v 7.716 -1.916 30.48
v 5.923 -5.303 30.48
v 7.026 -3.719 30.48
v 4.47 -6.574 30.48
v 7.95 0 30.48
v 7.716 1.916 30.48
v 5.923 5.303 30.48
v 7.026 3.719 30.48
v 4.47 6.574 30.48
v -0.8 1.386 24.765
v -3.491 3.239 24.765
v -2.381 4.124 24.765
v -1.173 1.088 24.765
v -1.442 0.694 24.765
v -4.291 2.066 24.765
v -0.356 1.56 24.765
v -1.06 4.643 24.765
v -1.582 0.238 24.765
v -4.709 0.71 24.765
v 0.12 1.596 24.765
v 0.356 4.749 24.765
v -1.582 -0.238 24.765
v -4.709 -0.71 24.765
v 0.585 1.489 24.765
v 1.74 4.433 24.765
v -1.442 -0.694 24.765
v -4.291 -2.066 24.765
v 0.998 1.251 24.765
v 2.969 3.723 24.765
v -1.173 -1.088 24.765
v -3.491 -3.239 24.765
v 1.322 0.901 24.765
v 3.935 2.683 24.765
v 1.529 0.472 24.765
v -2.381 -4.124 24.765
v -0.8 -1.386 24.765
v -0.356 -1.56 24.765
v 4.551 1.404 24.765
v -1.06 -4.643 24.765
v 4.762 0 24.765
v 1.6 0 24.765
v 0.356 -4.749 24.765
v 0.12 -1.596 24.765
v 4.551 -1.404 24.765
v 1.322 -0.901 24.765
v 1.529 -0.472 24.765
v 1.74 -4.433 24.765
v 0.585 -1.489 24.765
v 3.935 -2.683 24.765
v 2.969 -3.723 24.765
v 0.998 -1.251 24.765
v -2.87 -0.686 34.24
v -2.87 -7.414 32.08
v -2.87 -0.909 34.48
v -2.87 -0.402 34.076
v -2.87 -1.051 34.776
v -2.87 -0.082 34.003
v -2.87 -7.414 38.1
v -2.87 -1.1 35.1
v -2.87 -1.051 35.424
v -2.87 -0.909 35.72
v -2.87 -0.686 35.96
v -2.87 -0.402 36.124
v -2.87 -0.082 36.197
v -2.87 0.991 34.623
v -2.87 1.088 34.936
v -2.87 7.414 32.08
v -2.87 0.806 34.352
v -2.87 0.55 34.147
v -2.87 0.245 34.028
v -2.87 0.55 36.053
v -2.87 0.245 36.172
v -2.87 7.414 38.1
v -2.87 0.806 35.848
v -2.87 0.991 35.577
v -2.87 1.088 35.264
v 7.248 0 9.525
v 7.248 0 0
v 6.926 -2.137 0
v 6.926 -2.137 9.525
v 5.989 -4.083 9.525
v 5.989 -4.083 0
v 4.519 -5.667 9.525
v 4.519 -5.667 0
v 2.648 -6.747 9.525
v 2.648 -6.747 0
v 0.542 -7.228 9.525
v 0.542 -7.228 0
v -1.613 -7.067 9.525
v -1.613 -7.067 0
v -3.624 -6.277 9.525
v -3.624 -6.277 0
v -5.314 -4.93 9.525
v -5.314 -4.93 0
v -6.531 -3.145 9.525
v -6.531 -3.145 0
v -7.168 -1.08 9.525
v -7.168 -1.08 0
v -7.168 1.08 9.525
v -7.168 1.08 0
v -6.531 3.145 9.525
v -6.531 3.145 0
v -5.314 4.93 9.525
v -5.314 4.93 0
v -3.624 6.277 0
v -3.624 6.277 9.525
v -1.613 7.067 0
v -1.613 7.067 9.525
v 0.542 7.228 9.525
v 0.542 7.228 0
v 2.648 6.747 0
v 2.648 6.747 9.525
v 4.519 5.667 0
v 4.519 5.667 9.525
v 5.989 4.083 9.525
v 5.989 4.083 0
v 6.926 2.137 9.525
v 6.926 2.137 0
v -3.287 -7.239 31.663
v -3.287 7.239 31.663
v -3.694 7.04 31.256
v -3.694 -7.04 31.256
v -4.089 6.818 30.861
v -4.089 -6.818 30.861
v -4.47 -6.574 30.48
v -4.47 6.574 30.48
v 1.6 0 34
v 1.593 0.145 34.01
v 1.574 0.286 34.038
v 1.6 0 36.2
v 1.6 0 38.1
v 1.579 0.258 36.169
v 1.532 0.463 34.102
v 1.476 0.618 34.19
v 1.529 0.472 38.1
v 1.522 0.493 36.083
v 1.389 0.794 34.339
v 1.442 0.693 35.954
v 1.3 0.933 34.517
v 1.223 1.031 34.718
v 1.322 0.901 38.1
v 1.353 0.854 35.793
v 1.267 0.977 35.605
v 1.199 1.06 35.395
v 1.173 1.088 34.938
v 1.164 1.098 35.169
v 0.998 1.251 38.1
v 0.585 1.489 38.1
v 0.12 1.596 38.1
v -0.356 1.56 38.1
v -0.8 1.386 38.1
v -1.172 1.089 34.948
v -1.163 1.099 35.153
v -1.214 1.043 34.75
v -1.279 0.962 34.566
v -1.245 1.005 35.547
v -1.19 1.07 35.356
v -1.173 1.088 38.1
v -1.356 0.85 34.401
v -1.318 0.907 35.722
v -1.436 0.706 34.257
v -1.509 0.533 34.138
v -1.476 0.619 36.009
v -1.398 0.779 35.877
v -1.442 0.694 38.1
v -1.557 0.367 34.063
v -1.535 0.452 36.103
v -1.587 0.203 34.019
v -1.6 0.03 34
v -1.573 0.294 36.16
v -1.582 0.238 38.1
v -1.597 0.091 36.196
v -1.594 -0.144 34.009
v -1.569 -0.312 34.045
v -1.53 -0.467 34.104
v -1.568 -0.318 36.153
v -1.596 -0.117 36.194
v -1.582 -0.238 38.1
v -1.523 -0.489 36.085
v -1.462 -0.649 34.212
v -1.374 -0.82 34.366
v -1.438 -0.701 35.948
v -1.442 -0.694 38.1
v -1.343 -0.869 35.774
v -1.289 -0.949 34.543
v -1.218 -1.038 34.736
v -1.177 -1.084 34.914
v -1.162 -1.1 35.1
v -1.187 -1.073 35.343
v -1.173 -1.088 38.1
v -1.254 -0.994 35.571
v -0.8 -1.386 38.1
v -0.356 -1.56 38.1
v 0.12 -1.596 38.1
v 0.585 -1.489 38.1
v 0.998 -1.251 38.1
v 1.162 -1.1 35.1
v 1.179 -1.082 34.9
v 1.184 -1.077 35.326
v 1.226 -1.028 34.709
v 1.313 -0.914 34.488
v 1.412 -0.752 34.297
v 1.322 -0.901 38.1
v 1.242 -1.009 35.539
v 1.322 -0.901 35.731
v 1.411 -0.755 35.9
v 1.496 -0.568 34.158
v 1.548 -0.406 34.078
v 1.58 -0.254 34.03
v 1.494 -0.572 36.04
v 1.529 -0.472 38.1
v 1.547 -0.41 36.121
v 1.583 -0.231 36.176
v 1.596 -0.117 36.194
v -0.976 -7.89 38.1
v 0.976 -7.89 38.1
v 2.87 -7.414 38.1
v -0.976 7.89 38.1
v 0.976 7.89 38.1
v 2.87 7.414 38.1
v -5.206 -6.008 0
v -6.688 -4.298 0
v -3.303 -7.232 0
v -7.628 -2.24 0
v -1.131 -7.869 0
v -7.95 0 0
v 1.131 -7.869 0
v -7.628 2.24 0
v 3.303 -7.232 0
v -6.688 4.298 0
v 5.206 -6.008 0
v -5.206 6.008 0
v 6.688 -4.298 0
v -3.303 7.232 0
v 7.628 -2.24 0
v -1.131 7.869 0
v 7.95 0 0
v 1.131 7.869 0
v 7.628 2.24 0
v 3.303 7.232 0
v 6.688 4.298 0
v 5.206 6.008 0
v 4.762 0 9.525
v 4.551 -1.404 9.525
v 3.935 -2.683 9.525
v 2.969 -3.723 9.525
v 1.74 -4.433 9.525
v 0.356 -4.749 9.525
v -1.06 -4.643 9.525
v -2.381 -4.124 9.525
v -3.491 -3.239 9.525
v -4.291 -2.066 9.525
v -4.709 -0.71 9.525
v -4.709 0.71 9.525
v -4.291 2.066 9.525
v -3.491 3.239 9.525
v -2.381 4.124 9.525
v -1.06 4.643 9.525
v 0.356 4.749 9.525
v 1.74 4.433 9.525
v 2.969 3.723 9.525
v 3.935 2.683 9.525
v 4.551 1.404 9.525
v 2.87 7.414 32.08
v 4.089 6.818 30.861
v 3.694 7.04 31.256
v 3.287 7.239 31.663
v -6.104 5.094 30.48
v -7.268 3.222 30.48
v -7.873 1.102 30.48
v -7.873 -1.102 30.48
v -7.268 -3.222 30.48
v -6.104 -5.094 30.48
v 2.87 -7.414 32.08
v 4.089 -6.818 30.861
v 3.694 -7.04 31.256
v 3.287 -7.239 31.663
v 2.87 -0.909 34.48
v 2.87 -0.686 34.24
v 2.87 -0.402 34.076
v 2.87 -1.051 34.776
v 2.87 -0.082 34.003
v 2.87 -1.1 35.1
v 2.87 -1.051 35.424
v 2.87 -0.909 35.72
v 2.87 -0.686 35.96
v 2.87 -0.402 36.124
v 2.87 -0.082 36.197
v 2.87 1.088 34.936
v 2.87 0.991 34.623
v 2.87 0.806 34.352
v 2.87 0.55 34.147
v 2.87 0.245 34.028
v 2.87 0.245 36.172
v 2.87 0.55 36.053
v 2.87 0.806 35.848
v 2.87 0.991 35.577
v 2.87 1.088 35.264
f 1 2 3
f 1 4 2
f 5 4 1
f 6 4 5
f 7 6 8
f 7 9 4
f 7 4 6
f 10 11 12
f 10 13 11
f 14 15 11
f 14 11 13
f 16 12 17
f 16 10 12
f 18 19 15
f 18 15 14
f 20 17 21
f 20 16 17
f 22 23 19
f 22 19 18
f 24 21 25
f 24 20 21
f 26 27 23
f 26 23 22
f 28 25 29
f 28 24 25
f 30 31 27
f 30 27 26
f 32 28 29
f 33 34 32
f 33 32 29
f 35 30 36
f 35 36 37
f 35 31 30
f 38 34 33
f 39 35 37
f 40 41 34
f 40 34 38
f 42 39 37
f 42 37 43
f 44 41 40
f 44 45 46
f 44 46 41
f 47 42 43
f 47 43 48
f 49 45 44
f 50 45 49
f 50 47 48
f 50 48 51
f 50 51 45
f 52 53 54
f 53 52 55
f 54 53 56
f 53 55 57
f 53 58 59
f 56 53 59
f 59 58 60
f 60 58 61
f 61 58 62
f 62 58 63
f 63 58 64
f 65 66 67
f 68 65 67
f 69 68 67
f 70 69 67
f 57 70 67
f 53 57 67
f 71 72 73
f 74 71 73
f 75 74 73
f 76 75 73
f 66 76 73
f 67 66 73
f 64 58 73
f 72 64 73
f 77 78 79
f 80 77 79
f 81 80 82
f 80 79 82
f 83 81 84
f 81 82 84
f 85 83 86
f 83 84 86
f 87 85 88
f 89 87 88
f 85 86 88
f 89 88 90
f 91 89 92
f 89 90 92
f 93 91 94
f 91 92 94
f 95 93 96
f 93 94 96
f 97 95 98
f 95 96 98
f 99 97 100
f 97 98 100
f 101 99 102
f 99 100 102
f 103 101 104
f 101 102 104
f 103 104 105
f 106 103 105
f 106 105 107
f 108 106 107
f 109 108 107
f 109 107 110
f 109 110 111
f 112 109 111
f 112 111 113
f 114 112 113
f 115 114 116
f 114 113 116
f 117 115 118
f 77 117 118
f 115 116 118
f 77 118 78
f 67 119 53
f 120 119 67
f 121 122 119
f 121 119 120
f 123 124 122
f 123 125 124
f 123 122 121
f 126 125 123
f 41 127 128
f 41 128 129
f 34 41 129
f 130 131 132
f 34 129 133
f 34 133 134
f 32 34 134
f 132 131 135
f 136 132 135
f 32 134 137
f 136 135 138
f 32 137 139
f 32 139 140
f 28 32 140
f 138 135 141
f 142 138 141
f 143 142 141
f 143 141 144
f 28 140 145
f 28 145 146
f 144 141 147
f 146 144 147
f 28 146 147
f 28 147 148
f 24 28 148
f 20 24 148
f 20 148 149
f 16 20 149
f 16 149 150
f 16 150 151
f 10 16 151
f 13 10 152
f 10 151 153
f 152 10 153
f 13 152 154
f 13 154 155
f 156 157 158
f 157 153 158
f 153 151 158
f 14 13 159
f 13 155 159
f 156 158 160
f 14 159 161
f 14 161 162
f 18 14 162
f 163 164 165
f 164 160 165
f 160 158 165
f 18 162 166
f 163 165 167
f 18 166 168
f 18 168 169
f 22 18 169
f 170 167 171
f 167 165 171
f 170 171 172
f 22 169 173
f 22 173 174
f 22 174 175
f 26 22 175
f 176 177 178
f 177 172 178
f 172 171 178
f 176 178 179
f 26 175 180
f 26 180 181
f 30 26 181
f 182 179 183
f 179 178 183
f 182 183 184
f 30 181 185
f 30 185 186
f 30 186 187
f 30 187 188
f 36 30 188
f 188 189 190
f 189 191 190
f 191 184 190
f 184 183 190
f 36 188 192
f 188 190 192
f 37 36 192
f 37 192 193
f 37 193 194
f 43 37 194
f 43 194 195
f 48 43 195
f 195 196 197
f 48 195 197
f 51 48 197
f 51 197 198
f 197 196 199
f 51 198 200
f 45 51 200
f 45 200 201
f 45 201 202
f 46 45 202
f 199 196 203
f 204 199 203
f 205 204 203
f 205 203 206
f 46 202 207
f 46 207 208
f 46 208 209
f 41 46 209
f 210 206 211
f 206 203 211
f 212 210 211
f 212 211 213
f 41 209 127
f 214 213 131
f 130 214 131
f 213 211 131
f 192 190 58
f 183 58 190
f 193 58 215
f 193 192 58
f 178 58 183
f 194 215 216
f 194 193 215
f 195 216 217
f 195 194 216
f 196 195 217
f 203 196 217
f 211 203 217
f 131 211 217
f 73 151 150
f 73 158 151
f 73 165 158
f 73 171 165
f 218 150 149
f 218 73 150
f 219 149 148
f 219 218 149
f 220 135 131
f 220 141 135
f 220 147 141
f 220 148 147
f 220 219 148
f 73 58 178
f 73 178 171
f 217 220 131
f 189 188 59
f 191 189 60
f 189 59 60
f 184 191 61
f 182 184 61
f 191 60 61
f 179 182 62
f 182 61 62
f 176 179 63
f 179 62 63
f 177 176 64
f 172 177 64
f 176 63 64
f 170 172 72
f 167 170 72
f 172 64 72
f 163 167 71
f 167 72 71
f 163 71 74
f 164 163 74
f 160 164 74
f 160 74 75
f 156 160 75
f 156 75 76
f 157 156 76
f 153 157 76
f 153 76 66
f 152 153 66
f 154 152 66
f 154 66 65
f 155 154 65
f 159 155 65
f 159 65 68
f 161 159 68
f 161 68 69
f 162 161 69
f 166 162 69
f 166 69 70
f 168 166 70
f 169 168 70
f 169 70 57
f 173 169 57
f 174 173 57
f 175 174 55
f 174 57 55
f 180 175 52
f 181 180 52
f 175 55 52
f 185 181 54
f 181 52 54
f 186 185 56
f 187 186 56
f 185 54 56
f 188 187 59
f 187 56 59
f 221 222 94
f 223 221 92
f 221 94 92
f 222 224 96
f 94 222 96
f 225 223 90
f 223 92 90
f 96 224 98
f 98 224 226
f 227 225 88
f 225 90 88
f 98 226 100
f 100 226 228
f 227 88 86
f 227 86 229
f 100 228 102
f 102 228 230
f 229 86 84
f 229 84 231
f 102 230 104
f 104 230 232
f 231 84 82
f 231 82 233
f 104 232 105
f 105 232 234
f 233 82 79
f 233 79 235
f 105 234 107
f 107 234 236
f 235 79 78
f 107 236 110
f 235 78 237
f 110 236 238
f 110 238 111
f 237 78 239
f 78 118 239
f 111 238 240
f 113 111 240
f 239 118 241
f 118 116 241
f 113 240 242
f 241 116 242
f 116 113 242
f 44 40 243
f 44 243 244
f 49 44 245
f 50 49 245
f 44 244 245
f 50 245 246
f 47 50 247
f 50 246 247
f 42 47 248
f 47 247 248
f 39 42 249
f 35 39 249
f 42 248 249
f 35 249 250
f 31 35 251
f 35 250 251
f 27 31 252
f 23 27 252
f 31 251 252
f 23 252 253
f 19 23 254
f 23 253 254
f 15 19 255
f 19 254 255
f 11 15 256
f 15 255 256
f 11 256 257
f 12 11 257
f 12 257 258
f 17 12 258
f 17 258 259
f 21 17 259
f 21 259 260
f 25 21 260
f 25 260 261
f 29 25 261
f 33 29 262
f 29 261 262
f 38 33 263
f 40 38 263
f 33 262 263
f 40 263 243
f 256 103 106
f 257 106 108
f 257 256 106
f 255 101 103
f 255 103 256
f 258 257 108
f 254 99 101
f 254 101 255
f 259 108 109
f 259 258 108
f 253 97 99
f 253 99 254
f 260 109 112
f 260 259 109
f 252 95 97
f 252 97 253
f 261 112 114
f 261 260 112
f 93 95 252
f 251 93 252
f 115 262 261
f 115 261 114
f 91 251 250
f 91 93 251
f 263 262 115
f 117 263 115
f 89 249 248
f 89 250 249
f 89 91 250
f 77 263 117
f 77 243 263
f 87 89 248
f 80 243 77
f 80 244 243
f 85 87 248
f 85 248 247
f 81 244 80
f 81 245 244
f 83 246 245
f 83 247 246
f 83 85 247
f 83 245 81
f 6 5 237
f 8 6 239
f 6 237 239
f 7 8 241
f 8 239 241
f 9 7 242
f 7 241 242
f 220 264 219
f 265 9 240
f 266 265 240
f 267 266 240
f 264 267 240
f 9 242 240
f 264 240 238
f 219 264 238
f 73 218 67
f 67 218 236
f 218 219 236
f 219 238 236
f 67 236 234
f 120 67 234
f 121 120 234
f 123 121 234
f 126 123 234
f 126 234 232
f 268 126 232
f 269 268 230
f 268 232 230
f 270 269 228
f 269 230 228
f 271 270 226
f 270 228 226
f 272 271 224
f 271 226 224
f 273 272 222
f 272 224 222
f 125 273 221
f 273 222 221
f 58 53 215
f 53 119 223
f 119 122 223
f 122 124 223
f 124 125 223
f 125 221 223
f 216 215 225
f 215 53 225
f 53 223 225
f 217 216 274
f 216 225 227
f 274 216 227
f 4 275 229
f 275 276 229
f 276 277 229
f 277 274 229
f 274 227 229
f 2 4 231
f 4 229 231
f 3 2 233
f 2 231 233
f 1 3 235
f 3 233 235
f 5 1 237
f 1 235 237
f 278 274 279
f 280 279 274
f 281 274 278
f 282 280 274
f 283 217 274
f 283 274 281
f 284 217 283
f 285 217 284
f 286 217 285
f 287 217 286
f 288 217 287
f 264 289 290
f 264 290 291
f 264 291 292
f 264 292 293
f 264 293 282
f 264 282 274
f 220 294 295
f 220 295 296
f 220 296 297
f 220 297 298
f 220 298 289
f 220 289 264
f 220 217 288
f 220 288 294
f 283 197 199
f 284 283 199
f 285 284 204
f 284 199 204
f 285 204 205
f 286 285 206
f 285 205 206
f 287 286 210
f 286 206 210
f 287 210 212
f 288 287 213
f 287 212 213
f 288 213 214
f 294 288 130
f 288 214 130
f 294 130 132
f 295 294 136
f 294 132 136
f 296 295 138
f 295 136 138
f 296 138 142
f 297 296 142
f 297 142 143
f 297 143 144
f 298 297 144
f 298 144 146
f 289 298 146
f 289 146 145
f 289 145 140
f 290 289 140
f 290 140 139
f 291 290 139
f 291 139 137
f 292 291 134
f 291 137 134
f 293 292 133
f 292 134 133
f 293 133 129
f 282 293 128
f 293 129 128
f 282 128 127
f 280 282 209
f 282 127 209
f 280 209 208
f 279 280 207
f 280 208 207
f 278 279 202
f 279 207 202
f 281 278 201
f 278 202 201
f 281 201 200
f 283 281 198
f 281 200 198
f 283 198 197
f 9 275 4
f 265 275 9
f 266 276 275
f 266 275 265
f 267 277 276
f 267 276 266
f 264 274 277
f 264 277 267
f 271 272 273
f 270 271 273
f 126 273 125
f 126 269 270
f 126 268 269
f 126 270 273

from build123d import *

# Parameters (mm, degrees)
F0_R      = 7.95
F1_DEPTH  = 38.1
F2_R      = 7.2485
F3_DEPTH  = 9.525
F4_R      = 4.7625
F5_DEPTH  = 15.24
F6_R      = 1.6
F7_DEPTH  = 25.4
F8_W      = 5.08
F8_H      = 14.827758
F9_DEPTH  = 7.62
F10_R     = 1.1
F11_DEPTH = 25.4
F12_SIZE  = 1.6


with BuildPart() as f1:
    # F0 (on Top) → F1 (new body)
    with BuildSketch(Plane.XY):
        Circle(F0_R)
    extrude(amount=F1_DEPTH)

    # F2 (on face) → F3 (cut)
    with BuildSketch(Plane(origin=(0, 0, 0), x_dir=(1, 0, 0), z_dir=(0, 0, -1))):
        Circle(F2_R)
    extrude(amount=-F3_DEPTH, mode=Mode.SUBTRACT)

    # F4 (on face) → F5 (cut)
    with BuildSketch(Plane(origin=(0, 0, 9.525), x_dir=(1, 0, 0), z_dir=(0, 0, -1))):
        Circle(F4_R)
    extrude(amount=-F5_DEPTH, mode=Mode.SUBTRACT)

    # F6 (on face) → F7 (cut)
    with BuildSketch(Plane.XY.offset(38.1)):
        Circle(F6_R)
    extrude(amount=-F7_DEPTH, mode=Mode.SUBTRACT)

    # F8 (on face) → F9 (cut)
    with BuildSketch(Plane.XY.offset(38.1)):
        with Locations((-5.41, 0)):
            Rectangle(F8_W, F8_H)
        with Locations((5.41, 0)):
            Rectangle(F8_W, F8_H)
    extrude(amount=-F9_DEPTH, mode=Mode.SUBTRACT)

    # F10 (on face) → F11 (cut)
    with BuildSketch(Plane(origin=(-2.87, 0, 0), x_dir=(0, -1, 0), z_dir=(-1, 0, 0))):
        with Locations((0, 35.1)):
            Circle(F10_R)
    extrude(amount=-F11_DEPTH, mode=Mode.SUBTRACT)

    # F12
    f12_edges = [f1.edges().sort_by_distance(p)[0] for p in [
        (-2.87, 0, 30.48),
        (2.87, 0, 30.48),
    ]]
    chamfer(f12_edges, length=F12_SIZE)


solid = f1.part
